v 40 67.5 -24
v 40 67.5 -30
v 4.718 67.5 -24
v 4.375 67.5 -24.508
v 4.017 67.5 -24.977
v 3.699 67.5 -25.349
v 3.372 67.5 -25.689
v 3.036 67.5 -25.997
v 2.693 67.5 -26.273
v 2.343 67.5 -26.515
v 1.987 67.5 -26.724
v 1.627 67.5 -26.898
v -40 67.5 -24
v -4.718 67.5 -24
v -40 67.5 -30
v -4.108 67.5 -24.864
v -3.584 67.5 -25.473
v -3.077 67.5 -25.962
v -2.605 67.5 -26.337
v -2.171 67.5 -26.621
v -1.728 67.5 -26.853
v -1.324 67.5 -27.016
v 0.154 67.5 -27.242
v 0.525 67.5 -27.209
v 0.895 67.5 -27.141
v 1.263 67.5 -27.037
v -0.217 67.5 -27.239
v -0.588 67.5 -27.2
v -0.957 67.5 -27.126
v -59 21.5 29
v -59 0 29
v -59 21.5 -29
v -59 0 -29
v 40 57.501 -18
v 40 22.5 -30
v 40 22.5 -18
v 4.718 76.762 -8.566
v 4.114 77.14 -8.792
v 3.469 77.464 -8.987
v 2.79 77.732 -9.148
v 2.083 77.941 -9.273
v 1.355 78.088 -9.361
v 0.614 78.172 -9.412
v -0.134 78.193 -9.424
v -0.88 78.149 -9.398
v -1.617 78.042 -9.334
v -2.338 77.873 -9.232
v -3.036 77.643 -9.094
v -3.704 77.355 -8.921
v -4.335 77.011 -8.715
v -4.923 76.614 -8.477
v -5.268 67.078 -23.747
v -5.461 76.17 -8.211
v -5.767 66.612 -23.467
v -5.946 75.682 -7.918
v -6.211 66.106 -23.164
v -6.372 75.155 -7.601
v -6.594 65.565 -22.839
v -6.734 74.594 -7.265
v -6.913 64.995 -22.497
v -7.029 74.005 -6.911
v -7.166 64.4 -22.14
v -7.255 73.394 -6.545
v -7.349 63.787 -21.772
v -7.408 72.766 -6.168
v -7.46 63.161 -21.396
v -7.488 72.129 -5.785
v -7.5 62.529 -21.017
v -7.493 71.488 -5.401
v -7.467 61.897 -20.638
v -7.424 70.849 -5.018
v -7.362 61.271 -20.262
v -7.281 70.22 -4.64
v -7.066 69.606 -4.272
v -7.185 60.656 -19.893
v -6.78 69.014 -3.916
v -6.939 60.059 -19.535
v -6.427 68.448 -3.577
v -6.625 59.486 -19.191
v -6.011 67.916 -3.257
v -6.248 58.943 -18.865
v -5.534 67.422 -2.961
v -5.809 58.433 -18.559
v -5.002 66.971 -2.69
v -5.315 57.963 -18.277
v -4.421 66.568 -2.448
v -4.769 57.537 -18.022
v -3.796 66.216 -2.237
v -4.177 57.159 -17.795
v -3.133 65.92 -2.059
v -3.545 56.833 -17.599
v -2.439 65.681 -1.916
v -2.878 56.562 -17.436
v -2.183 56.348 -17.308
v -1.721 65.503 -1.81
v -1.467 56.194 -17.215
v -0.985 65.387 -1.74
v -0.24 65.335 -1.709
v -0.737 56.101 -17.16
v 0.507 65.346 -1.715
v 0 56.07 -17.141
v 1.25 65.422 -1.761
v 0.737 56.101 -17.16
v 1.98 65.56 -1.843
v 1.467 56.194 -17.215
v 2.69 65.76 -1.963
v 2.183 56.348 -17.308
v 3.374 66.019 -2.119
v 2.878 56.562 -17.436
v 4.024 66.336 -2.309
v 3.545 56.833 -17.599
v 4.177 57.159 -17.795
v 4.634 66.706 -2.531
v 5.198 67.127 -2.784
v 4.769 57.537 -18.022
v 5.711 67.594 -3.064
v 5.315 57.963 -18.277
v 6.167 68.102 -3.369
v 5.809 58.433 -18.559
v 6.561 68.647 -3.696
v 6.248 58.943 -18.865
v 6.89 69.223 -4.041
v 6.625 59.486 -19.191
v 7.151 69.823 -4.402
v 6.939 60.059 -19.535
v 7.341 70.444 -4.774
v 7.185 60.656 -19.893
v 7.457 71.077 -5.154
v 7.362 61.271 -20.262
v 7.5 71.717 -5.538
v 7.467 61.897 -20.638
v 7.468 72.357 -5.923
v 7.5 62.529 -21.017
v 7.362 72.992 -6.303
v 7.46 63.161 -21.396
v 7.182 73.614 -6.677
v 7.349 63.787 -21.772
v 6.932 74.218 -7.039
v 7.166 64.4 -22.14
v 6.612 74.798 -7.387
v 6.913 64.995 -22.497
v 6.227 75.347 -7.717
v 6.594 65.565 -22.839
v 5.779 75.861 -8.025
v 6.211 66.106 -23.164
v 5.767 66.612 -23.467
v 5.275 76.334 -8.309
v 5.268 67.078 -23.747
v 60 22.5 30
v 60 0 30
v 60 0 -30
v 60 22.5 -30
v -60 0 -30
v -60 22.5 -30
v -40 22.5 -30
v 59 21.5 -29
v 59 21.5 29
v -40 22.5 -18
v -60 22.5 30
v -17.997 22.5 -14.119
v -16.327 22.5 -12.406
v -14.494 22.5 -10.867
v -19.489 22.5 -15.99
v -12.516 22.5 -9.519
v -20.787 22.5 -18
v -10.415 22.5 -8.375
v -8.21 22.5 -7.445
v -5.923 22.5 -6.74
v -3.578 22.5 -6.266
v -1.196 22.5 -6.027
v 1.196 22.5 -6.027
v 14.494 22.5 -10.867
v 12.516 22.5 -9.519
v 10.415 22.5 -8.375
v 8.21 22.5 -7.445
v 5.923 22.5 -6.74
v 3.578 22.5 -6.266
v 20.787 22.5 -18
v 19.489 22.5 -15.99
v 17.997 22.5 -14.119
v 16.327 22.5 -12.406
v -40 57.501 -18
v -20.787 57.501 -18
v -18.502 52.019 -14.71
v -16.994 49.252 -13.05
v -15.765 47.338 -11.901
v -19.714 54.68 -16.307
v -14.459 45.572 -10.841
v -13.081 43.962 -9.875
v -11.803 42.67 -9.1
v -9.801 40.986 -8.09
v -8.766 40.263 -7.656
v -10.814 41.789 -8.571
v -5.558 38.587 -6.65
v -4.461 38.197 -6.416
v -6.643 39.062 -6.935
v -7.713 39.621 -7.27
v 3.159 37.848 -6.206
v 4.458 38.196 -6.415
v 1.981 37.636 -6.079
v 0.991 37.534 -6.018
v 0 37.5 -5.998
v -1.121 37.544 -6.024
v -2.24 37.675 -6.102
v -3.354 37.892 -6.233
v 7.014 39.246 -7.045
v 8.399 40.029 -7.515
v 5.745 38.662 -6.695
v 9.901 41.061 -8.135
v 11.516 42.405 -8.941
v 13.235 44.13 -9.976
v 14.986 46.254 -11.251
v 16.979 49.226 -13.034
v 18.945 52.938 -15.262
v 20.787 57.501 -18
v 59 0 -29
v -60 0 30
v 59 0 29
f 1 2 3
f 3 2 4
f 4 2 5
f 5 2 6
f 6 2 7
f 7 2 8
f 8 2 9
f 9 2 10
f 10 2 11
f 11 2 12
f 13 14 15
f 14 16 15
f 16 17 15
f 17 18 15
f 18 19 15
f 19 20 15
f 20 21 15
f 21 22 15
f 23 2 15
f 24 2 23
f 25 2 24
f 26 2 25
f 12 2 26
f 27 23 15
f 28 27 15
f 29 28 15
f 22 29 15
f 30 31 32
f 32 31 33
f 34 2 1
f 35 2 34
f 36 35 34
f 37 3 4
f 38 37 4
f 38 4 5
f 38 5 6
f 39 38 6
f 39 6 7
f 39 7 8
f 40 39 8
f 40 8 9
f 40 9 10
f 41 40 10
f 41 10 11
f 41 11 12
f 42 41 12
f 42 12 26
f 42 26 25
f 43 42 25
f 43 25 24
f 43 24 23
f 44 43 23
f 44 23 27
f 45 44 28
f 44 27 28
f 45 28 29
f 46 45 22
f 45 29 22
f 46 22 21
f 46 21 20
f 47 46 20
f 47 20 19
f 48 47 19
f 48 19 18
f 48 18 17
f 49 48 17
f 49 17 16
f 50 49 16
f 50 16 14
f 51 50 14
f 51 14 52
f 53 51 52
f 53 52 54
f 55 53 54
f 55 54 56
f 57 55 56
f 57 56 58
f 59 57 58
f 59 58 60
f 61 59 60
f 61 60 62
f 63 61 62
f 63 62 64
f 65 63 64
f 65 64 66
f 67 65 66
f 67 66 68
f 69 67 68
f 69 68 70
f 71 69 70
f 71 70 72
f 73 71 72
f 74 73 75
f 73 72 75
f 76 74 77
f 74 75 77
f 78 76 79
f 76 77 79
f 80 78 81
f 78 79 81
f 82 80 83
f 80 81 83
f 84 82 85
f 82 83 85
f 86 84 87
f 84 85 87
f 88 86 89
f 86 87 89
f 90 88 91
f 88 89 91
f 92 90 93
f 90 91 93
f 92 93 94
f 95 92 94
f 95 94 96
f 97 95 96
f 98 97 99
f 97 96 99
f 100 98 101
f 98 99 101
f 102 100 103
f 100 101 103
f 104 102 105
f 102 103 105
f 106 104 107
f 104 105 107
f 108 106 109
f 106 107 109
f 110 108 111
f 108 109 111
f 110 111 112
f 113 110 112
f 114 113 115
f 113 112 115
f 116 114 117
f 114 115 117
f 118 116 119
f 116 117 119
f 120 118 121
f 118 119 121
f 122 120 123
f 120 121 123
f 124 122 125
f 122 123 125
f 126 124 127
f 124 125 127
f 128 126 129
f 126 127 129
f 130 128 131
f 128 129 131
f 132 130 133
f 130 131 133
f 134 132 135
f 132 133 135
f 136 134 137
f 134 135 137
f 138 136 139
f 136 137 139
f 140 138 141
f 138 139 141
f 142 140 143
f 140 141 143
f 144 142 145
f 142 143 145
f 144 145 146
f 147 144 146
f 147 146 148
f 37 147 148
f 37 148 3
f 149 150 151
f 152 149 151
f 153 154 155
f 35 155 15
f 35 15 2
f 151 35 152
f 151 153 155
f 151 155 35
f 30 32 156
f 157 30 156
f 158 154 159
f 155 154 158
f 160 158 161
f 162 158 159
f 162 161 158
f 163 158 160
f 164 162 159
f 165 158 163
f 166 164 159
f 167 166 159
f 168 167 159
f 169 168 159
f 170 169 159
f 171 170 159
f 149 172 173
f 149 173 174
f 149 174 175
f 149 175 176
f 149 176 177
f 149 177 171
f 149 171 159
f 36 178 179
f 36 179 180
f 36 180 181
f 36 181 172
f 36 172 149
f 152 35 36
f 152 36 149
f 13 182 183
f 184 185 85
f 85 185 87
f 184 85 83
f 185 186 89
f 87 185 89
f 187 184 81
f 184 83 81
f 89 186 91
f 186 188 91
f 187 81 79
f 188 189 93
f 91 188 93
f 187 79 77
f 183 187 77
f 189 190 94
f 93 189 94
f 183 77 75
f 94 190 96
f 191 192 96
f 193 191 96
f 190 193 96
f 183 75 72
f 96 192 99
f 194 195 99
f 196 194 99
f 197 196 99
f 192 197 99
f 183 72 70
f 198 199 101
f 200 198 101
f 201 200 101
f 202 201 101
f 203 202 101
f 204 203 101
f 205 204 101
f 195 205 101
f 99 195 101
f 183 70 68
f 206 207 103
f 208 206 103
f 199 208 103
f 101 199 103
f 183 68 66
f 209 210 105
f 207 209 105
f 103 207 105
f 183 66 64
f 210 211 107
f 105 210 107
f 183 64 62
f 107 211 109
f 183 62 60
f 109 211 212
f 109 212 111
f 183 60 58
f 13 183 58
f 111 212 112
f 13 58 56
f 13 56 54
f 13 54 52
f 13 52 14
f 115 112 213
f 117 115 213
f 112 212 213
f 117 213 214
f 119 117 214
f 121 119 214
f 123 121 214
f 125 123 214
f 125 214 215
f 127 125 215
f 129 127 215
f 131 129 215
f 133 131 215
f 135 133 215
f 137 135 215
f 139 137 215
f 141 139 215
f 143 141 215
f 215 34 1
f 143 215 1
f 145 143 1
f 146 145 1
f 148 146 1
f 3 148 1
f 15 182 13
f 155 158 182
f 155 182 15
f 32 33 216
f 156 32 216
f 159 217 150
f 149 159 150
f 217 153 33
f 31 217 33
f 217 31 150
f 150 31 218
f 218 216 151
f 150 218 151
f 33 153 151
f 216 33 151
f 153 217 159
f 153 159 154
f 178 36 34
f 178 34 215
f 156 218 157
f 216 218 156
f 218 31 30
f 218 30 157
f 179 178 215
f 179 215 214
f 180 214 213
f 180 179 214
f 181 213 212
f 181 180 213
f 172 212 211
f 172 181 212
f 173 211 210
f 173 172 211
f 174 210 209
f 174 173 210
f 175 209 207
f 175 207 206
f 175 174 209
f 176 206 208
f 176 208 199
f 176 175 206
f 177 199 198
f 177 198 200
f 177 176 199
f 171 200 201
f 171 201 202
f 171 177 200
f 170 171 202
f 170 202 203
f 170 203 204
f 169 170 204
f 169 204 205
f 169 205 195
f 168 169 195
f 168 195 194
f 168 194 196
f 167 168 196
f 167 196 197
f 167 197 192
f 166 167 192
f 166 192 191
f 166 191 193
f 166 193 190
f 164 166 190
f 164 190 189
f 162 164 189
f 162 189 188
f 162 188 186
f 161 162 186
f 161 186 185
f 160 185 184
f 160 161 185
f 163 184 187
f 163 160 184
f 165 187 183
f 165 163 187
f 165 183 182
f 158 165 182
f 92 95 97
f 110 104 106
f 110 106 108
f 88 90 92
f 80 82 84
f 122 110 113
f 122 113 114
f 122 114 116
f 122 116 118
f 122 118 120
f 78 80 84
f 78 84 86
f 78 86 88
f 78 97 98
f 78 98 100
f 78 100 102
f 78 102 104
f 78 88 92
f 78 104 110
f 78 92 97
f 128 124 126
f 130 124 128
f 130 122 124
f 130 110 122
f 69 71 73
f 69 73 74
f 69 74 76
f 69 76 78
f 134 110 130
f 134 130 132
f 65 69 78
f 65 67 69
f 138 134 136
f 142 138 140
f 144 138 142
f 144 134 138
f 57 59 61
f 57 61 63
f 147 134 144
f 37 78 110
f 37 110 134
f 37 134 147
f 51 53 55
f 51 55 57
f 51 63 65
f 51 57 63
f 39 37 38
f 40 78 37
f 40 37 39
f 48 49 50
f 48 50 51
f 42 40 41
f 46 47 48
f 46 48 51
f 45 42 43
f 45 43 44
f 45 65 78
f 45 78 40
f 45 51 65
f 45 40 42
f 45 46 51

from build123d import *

# Parameters (mm, degrees)
SKETCH1_W                       = 120
SKETCH1_H                       = 60
BOSS_EXTRUDE1_DEPTH             = 22.5
SHELL1_T                        = -1
BOSS_EXTRUDE2_DEPTH             = 45
CUT_EXTRUDE1_DEPTH              = 125.323167592
BOSS_EXTRUDE3_REACH             = 96.877
SKETCH8_R                       = 7.5
BOSS_EXTRUDE3_DIRECTION_2_DEPTH = 18


with BuildPart() as part:
    # Sketch1 → Boss-Extrude1 (new body)
    with BuildSketch(Plane(origin=(0, 0, 0), x_dir=(1, 0, 0), z_dir=(0, 1, 0))):
        Rectangle(SKETCH1_W, SKETCH1_H)
    extrude(amount=BOSS_EXTRUDE1_DEPTH)

    # Shell1
    shell1_openings = [part.faces().sort_by_distance(p)[0] for p in [
        (0, 0, 0),
    ]]
    offset(amount=SHELL1_T, openings=shell1_openings, kind=Kind.INTERSECTION)

    # Sketch2 → Boss-Extrude2 (add)
    with BuildSketch(Plane(origin=(0, 22.5, 0), x_dir=(1, 0, 0), z_dir=(0, 1, 0))):
        with BuildLine():
            Line((-40, 30), (40, 30))
            Line((40, 30), (40, 18))
            Line((40, 18), (20.787496232, 18))
            ThreePointArc((20.787496232, 18), (0, 5.997500139), (-20.787496232, 18))
            Line((-20.787496232, 18), (-40, 18))
            Line((-40, 18), (-40, 30))
        make_face()
    extrude(amount=BOSS_EXTRUDE2_DEPTH)

    # Sketch3 → Cut-Extrude1 (cut, through all)
    with BuildSketch(Plane(origin=(40, 0, 0), x_dir=(0, 0, -1), z_dir=(1, 0, 0))):
        Polygon((24, 67.5), (5.997500139, 67.5), (5.997500139, 37.5), align=None)
    extrude(amount=-CUT_EXTRUDE1_DEPTH, mode=Mode.SUBTRACT)

    # Sketch8 → Boss-Extrude3 (add, up to next)
    with BuildSketch(Plane(origin=(0, 7.282369087, 12.135596405), x_dir=(1, 0, 0), z_dir=(0, 0.514548292074691, 0.8574614015353803)), mode=Mode.PRIVATE) as boss_extrude3_sk1:
        with Locations((0, 64.397447073)):
            Circle(SKETCH8_R)
    boss_extrude3_tool1 = extrude(boss_extrude3_sk1.sketch, amount=-BOSS_EXTRUDE3_REACH, mode=Mode.PRIVATE) - part.part
    add(boss_extrude3_tool1.solids().sort_by_distance((0, 62.500694, -21))[0])

    # Sketch8 → Boss-Extrude3 direction 2 (add)
    with BuildSketch(Plane(origin=(0, 7.282369087, 12.135596405), x_dir=(1, 0, 0), z_dir=(0, 0.514548292074691, 0.8574614015353803))):
        with Locations((0, 64.397447073)):
            Circle(SKETCH8_R)
    extrude(amount=BOSS_EXTRUDE3_DIRECTION_2_DEPTH)


solid = part.part
